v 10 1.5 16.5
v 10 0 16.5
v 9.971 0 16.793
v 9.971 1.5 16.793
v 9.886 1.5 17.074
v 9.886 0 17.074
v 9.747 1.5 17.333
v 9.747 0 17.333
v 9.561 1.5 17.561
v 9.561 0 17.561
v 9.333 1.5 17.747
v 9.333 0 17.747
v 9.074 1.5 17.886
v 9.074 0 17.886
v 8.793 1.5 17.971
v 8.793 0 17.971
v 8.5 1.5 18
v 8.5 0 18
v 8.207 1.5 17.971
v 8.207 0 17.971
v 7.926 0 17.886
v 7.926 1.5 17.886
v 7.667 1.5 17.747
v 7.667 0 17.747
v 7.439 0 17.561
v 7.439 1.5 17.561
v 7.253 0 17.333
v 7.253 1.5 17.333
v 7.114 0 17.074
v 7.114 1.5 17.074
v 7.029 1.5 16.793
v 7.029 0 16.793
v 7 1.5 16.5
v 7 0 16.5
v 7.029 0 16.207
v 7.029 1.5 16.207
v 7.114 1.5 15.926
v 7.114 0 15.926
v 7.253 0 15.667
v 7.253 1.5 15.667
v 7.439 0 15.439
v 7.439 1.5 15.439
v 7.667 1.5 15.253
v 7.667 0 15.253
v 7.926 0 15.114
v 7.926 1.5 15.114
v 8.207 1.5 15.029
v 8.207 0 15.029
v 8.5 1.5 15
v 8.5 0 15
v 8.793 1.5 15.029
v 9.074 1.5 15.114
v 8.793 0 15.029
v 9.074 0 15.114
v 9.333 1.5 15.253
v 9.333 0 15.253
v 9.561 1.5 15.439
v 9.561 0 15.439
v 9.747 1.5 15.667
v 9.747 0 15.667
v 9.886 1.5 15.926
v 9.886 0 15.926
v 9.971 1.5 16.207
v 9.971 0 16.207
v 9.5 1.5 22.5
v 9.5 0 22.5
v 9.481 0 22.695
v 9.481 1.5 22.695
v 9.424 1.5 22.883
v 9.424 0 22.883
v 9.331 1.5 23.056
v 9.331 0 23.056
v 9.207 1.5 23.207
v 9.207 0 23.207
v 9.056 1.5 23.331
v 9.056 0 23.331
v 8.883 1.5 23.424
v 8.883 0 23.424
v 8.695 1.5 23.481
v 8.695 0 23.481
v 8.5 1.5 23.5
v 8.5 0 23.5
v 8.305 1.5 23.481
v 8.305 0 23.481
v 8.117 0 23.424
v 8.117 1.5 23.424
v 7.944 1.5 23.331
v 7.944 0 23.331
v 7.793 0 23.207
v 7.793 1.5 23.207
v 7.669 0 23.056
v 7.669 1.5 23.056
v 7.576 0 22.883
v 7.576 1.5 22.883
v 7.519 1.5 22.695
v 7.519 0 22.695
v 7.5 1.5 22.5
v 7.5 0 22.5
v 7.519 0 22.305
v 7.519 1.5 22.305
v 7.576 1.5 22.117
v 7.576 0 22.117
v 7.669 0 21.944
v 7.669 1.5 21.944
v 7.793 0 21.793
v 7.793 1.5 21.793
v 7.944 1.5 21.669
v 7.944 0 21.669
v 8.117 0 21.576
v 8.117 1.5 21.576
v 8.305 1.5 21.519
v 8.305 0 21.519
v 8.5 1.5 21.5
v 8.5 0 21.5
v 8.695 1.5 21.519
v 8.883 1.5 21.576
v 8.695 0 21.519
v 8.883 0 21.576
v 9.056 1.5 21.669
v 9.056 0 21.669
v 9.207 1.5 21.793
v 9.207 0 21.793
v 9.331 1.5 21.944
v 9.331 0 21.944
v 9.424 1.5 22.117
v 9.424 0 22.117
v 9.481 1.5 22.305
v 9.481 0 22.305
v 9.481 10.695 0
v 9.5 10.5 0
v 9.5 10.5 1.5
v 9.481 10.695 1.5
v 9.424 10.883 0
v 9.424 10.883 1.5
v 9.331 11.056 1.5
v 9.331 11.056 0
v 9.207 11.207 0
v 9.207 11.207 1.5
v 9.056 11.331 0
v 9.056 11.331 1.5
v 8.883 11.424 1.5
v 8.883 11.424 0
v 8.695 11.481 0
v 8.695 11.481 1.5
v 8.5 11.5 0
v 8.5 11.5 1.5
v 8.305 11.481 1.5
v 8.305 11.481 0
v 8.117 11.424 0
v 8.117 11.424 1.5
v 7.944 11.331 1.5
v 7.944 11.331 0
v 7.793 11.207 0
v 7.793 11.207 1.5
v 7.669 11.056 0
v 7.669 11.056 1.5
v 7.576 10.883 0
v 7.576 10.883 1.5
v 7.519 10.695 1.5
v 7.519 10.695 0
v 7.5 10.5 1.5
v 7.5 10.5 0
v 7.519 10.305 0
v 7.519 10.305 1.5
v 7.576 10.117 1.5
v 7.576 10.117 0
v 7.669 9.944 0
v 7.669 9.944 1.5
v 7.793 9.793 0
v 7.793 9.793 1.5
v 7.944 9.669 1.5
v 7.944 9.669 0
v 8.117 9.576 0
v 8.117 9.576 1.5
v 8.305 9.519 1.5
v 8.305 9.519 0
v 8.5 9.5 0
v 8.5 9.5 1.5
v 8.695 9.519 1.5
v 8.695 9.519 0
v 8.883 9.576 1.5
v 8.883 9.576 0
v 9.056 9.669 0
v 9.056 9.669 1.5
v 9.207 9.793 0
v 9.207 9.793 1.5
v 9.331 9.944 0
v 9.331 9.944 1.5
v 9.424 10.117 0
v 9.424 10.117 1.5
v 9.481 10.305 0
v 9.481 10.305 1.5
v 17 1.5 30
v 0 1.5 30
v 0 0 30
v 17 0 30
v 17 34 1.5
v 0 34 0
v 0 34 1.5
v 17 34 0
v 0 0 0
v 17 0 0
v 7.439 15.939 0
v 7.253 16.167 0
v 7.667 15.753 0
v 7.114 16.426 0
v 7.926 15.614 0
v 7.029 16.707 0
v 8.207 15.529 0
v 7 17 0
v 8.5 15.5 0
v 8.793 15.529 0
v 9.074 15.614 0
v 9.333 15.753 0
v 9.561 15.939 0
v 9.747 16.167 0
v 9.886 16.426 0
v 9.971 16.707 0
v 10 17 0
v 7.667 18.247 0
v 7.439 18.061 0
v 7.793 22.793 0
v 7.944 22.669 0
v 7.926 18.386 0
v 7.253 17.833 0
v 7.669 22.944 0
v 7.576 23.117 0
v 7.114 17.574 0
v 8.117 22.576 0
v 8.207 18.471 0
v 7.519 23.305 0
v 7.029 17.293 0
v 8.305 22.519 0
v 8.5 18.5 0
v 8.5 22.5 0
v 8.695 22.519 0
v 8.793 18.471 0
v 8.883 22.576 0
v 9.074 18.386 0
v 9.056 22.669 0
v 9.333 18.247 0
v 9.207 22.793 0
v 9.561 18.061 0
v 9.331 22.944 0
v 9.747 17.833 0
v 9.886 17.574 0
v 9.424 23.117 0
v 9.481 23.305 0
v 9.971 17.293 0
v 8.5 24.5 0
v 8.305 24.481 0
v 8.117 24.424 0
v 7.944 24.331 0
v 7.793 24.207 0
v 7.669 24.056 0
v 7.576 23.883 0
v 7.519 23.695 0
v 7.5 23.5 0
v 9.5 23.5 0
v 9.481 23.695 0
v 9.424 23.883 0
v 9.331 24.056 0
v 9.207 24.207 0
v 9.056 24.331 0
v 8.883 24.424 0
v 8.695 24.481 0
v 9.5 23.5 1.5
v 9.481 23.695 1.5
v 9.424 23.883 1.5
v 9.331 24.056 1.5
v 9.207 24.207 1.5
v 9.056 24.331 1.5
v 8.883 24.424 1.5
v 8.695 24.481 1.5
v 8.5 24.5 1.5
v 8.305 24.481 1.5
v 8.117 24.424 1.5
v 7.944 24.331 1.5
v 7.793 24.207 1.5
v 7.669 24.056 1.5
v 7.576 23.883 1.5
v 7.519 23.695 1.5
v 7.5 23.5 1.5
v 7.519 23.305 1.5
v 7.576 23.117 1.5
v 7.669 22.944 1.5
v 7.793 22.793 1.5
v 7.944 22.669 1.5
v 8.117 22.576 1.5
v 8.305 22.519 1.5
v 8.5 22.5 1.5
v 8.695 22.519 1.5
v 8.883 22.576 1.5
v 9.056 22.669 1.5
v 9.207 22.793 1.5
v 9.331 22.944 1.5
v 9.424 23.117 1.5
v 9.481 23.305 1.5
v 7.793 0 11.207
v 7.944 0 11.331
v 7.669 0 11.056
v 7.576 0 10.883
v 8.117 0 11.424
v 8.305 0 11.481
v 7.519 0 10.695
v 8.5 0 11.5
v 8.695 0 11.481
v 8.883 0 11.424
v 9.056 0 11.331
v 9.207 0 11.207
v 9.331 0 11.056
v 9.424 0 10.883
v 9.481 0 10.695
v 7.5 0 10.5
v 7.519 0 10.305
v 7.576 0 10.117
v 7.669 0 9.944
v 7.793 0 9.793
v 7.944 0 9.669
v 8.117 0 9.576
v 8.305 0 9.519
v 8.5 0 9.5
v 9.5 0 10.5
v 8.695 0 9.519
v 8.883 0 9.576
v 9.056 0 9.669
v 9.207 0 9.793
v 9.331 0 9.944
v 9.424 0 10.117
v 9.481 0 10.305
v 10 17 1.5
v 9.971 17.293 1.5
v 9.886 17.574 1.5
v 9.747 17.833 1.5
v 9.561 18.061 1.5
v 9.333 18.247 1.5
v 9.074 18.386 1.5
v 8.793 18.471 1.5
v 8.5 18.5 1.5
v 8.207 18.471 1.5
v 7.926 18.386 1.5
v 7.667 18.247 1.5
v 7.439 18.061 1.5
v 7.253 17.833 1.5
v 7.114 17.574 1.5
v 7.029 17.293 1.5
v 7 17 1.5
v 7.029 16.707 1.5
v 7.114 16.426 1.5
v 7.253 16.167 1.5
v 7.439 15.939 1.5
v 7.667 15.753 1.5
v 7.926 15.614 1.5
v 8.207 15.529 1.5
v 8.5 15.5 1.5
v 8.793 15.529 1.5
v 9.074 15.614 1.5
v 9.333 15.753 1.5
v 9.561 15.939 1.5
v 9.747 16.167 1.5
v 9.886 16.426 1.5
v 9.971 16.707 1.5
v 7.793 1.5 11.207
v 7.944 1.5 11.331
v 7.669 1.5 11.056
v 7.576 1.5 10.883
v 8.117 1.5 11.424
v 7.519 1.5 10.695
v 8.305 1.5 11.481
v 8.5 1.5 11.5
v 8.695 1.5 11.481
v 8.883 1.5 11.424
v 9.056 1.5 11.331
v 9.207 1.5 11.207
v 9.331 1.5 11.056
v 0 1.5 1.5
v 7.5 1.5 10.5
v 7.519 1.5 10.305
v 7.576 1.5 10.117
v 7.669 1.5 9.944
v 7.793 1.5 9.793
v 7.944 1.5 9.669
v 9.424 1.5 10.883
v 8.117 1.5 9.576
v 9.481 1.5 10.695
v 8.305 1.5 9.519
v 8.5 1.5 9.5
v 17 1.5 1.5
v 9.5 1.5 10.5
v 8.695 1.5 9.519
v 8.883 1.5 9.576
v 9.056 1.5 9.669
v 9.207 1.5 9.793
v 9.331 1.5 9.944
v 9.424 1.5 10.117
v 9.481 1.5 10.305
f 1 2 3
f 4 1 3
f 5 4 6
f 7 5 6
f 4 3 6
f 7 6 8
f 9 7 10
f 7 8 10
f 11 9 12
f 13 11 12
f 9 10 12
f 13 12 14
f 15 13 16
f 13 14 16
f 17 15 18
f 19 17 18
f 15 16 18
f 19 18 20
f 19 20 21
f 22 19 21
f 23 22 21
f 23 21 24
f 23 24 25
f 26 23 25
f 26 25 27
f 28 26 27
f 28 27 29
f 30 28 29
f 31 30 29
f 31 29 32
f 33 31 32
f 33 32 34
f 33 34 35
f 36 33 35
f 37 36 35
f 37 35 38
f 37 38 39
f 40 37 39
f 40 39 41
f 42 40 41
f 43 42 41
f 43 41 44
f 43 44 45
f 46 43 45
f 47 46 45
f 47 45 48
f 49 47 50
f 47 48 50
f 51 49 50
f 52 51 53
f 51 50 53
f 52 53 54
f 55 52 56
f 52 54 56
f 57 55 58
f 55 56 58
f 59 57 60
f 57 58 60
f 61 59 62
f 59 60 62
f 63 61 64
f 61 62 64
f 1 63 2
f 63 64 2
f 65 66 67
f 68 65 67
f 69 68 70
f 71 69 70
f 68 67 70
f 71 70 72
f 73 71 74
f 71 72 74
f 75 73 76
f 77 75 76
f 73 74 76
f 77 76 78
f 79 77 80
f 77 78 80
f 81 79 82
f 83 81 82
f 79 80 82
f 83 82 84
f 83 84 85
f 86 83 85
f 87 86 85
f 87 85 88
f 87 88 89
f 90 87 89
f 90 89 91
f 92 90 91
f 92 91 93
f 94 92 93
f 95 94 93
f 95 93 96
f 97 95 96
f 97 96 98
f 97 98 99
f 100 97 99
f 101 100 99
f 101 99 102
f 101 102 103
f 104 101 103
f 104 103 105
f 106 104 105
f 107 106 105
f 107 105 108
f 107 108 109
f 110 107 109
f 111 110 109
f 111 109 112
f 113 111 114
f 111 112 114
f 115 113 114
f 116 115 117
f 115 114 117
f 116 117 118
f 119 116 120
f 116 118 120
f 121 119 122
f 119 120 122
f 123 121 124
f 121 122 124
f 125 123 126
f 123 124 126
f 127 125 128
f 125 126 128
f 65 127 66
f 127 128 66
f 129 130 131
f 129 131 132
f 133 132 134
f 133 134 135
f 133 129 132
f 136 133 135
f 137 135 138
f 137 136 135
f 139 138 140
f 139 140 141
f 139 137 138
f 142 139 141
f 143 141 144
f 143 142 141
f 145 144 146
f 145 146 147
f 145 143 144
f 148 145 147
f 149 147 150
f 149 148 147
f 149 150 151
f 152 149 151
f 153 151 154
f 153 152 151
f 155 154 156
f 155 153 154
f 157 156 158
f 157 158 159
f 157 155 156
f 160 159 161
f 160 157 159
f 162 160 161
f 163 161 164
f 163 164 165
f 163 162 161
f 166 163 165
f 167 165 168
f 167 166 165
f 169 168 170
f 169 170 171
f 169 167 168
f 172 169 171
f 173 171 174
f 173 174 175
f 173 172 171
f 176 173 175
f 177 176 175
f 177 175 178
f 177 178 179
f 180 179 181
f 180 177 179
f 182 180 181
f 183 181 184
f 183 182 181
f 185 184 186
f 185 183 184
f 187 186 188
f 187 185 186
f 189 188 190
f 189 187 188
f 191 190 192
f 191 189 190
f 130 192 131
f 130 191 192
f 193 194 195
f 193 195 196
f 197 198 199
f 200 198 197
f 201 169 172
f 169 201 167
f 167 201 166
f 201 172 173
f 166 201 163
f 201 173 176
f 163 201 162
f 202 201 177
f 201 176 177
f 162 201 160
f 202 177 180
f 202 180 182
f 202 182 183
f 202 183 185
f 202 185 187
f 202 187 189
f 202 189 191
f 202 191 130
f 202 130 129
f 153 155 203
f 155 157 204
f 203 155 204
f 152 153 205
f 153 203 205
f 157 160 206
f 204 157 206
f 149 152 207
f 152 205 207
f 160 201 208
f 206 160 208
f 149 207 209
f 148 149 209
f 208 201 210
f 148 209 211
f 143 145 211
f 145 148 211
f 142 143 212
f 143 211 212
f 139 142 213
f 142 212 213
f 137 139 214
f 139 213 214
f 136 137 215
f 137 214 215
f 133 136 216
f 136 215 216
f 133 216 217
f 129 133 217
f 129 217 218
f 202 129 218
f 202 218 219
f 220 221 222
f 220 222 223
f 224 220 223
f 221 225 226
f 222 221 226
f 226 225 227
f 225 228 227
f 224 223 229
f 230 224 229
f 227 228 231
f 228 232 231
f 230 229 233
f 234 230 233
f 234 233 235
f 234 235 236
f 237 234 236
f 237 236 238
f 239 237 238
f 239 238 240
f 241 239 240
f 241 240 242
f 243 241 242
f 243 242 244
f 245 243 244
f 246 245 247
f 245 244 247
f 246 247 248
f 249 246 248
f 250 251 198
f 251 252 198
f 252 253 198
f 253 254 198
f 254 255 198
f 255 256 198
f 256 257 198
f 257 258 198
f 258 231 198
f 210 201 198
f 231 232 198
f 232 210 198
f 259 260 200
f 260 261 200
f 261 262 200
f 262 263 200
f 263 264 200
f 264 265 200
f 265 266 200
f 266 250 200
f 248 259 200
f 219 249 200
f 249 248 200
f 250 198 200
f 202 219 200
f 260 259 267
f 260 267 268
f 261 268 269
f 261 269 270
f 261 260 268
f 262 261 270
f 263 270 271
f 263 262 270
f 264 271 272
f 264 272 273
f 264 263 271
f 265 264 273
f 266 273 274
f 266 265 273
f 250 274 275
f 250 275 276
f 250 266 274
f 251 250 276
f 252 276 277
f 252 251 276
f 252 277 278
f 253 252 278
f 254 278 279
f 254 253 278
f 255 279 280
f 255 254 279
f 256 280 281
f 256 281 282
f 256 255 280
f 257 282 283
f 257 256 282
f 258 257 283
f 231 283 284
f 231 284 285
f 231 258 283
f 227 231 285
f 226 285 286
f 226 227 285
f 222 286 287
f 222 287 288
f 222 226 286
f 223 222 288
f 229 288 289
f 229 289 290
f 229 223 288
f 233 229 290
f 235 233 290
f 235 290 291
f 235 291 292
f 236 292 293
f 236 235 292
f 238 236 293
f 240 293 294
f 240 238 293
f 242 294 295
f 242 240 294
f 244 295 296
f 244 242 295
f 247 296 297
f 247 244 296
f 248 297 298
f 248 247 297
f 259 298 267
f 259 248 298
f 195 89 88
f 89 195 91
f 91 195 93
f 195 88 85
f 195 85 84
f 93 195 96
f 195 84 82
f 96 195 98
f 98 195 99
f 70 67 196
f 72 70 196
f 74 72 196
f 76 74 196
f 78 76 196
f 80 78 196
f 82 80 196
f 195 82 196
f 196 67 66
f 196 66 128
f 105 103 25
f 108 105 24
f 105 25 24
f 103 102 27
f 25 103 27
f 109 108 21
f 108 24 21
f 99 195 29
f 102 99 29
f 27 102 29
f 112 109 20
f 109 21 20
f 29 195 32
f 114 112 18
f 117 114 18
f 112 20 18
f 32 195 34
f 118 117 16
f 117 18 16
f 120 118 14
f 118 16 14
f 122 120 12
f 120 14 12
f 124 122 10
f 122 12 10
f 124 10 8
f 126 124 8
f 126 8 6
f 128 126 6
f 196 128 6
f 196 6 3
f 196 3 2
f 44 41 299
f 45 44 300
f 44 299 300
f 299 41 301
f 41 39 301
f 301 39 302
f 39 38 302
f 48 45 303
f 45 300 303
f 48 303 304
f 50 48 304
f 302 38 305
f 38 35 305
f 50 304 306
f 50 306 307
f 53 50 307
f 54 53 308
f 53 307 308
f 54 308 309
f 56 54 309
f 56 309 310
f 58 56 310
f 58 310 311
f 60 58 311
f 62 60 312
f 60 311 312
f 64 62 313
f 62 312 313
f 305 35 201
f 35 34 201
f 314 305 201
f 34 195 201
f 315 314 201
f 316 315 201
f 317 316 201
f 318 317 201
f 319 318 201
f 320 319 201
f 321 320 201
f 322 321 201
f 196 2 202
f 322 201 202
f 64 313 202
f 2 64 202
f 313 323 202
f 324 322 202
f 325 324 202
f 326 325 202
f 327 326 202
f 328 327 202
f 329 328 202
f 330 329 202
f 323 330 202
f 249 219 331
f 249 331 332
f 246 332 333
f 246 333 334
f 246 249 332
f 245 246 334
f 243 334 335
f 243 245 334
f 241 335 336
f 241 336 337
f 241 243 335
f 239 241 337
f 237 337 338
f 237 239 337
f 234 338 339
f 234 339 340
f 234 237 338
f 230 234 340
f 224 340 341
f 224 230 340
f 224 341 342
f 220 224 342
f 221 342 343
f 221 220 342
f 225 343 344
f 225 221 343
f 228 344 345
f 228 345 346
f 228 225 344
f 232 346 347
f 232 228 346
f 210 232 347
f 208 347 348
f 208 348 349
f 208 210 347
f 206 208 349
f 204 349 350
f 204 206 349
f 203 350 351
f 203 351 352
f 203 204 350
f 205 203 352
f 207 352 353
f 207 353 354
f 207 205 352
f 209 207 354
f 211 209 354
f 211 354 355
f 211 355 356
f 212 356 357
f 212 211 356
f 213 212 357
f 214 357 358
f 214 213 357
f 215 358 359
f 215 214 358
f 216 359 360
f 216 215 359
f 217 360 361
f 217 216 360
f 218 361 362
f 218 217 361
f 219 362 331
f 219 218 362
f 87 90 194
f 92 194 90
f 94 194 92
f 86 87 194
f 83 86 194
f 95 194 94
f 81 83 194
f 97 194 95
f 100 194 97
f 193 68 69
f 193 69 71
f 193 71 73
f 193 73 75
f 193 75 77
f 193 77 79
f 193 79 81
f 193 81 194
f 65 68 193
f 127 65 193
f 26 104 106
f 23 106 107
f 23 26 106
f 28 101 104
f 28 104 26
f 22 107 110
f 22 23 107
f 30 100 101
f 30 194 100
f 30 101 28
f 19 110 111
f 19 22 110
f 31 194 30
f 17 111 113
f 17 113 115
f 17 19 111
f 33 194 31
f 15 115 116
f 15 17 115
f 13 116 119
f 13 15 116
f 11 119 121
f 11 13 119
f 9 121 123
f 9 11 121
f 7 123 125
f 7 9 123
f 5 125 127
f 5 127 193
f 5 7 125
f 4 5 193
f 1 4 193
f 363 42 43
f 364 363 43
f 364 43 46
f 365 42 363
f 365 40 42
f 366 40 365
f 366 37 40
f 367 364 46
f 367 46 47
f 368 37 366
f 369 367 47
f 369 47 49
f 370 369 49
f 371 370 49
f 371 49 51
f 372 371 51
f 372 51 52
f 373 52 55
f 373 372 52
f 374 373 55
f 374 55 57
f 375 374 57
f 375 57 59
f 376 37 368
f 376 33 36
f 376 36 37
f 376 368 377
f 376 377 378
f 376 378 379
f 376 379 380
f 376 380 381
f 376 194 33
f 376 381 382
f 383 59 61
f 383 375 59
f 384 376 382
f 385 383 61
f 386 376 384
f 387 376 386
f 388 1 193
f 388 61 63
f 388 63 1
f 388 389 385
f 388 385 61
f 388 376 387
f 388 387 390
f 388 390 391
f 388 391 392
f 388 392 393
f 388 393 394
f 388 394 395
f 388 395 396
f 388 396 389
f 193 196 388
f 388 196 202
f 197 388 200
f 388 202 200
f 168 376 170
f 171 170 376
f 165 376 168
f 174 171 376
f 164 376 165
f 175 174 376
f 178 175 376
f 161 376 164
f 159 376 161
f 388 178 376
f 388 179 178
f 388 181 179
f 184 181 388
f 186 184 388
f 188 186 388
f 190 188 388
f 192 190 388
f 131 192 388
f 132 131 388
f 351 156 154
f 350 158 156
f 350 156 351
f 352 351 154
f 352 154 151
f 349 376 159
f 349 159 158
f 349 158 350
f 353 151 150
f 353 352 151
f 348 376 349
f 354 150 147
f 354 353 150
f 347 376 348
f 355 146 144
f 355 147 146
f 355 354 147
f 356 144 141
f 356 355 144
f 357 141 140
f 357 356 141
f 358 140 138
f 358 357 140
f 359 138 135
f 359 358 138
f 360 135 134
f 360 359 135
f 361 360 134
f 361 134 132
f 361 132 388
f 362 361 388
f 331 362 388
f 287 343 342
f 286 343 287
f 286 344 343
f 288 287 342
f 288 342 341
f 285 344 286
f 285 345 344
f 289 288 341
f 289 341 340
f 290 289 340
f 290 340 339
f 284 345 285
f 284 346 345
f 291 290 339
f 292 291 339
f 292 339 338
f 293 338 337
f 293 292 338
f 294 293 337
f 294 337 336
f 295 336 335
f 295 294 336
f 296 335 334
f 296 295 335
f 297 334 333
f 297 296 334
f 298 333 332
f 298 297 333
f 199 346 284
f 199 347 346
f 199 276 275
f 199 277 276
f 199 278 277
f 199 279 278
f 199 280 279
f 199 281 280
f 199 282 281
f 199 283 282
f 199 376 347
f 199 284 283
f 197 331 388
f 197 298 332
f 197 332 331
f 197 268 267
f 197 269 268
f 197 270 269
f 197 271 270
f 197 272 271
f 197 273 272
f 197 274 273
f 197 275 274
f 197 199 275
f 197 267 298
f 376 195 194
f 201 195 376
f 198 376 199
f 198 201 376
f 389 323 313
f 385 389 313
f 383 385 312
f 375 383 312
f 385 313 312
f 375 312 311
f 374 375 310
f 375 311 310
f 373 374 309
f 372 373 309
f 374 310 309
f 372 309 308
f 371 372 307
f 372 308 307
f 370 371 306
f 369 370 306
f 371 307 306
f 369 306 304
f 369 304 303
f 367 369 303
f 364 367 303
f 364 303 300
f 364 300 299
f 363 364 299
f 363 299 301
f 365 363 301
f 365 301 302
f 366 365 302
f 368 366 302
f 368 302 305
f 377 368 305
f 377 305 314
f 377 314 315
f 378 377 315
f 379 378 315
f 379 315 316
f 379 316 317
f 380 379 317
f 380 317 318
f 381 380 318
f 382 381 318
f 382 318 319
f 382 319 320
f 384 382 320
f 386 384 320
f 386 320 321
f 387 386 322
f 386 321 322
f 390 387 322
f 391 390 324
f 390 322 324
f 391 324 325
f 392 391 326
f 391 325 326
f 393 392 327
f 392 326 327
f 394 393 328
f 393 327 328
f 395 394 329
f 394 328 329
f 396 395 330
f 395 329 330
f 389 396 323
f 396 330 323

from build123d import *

# Parameters (mm, degrees)
SKETCH_W      = 17
SKETCH_H      = 34
SKETCH_R      = 1.5
SKETCH_R_2    = 1
PAD_DEPTH     = 1.5
SKETCH001_W   = 17
SKETCH001_H   = 1.5
PAD001_DEPTH  = 30
SKETCH002_R   = 1.5
SKETCH002_R_2 = 1
POCKET_DEPTH  = 34.001


with BuildPart() as part:
    # Sketch → Pad (new body)
    with BuildSketch(Plane.XY):
        with Locations((8.5, 17)):
            Rectangle(SKETCH_W, SKETCH_H)
        with Locations((8.5, 17)):
            Circle(SKETCH_R, mode=Mode.SUBTRACT)
        with Locations((8.5, 10.5)):
            Circle(SKETCH_R_2, mode=Mode.SUBTRACT)
        with Locations((8.5, 23.5)):
            Circle(SKETCH_R_2, mode=Mode.SUBTRACT)
    extrude(amount=PAD_DEPTH)

    # Sketch001 → Pad001 (new body)
    with BuildSketch(Plane.XY):
        with Locations((8.5, 0.75)):
            Rectangle(SKETCH001_W, SKETCH001_H)
    extrude(amount=PAD001_DEPTH)

    # Sketch002 → Pocket (cut, through all)
    with BuildSketch(Plane.XZ):
        with Locations((8.5, 16.5)):
            Circle(SKETCH002_R)
        with Locations((8.5, 10.5)):
            Circle(SKETCH002_R_2)
        with Locations((8.5, 22.5)):
            Circle(SKETCH002_R_2)
    extrude(amount=-POCKET_DEPTH, mode=Mode.SUBTRACT)


solid = part.part
